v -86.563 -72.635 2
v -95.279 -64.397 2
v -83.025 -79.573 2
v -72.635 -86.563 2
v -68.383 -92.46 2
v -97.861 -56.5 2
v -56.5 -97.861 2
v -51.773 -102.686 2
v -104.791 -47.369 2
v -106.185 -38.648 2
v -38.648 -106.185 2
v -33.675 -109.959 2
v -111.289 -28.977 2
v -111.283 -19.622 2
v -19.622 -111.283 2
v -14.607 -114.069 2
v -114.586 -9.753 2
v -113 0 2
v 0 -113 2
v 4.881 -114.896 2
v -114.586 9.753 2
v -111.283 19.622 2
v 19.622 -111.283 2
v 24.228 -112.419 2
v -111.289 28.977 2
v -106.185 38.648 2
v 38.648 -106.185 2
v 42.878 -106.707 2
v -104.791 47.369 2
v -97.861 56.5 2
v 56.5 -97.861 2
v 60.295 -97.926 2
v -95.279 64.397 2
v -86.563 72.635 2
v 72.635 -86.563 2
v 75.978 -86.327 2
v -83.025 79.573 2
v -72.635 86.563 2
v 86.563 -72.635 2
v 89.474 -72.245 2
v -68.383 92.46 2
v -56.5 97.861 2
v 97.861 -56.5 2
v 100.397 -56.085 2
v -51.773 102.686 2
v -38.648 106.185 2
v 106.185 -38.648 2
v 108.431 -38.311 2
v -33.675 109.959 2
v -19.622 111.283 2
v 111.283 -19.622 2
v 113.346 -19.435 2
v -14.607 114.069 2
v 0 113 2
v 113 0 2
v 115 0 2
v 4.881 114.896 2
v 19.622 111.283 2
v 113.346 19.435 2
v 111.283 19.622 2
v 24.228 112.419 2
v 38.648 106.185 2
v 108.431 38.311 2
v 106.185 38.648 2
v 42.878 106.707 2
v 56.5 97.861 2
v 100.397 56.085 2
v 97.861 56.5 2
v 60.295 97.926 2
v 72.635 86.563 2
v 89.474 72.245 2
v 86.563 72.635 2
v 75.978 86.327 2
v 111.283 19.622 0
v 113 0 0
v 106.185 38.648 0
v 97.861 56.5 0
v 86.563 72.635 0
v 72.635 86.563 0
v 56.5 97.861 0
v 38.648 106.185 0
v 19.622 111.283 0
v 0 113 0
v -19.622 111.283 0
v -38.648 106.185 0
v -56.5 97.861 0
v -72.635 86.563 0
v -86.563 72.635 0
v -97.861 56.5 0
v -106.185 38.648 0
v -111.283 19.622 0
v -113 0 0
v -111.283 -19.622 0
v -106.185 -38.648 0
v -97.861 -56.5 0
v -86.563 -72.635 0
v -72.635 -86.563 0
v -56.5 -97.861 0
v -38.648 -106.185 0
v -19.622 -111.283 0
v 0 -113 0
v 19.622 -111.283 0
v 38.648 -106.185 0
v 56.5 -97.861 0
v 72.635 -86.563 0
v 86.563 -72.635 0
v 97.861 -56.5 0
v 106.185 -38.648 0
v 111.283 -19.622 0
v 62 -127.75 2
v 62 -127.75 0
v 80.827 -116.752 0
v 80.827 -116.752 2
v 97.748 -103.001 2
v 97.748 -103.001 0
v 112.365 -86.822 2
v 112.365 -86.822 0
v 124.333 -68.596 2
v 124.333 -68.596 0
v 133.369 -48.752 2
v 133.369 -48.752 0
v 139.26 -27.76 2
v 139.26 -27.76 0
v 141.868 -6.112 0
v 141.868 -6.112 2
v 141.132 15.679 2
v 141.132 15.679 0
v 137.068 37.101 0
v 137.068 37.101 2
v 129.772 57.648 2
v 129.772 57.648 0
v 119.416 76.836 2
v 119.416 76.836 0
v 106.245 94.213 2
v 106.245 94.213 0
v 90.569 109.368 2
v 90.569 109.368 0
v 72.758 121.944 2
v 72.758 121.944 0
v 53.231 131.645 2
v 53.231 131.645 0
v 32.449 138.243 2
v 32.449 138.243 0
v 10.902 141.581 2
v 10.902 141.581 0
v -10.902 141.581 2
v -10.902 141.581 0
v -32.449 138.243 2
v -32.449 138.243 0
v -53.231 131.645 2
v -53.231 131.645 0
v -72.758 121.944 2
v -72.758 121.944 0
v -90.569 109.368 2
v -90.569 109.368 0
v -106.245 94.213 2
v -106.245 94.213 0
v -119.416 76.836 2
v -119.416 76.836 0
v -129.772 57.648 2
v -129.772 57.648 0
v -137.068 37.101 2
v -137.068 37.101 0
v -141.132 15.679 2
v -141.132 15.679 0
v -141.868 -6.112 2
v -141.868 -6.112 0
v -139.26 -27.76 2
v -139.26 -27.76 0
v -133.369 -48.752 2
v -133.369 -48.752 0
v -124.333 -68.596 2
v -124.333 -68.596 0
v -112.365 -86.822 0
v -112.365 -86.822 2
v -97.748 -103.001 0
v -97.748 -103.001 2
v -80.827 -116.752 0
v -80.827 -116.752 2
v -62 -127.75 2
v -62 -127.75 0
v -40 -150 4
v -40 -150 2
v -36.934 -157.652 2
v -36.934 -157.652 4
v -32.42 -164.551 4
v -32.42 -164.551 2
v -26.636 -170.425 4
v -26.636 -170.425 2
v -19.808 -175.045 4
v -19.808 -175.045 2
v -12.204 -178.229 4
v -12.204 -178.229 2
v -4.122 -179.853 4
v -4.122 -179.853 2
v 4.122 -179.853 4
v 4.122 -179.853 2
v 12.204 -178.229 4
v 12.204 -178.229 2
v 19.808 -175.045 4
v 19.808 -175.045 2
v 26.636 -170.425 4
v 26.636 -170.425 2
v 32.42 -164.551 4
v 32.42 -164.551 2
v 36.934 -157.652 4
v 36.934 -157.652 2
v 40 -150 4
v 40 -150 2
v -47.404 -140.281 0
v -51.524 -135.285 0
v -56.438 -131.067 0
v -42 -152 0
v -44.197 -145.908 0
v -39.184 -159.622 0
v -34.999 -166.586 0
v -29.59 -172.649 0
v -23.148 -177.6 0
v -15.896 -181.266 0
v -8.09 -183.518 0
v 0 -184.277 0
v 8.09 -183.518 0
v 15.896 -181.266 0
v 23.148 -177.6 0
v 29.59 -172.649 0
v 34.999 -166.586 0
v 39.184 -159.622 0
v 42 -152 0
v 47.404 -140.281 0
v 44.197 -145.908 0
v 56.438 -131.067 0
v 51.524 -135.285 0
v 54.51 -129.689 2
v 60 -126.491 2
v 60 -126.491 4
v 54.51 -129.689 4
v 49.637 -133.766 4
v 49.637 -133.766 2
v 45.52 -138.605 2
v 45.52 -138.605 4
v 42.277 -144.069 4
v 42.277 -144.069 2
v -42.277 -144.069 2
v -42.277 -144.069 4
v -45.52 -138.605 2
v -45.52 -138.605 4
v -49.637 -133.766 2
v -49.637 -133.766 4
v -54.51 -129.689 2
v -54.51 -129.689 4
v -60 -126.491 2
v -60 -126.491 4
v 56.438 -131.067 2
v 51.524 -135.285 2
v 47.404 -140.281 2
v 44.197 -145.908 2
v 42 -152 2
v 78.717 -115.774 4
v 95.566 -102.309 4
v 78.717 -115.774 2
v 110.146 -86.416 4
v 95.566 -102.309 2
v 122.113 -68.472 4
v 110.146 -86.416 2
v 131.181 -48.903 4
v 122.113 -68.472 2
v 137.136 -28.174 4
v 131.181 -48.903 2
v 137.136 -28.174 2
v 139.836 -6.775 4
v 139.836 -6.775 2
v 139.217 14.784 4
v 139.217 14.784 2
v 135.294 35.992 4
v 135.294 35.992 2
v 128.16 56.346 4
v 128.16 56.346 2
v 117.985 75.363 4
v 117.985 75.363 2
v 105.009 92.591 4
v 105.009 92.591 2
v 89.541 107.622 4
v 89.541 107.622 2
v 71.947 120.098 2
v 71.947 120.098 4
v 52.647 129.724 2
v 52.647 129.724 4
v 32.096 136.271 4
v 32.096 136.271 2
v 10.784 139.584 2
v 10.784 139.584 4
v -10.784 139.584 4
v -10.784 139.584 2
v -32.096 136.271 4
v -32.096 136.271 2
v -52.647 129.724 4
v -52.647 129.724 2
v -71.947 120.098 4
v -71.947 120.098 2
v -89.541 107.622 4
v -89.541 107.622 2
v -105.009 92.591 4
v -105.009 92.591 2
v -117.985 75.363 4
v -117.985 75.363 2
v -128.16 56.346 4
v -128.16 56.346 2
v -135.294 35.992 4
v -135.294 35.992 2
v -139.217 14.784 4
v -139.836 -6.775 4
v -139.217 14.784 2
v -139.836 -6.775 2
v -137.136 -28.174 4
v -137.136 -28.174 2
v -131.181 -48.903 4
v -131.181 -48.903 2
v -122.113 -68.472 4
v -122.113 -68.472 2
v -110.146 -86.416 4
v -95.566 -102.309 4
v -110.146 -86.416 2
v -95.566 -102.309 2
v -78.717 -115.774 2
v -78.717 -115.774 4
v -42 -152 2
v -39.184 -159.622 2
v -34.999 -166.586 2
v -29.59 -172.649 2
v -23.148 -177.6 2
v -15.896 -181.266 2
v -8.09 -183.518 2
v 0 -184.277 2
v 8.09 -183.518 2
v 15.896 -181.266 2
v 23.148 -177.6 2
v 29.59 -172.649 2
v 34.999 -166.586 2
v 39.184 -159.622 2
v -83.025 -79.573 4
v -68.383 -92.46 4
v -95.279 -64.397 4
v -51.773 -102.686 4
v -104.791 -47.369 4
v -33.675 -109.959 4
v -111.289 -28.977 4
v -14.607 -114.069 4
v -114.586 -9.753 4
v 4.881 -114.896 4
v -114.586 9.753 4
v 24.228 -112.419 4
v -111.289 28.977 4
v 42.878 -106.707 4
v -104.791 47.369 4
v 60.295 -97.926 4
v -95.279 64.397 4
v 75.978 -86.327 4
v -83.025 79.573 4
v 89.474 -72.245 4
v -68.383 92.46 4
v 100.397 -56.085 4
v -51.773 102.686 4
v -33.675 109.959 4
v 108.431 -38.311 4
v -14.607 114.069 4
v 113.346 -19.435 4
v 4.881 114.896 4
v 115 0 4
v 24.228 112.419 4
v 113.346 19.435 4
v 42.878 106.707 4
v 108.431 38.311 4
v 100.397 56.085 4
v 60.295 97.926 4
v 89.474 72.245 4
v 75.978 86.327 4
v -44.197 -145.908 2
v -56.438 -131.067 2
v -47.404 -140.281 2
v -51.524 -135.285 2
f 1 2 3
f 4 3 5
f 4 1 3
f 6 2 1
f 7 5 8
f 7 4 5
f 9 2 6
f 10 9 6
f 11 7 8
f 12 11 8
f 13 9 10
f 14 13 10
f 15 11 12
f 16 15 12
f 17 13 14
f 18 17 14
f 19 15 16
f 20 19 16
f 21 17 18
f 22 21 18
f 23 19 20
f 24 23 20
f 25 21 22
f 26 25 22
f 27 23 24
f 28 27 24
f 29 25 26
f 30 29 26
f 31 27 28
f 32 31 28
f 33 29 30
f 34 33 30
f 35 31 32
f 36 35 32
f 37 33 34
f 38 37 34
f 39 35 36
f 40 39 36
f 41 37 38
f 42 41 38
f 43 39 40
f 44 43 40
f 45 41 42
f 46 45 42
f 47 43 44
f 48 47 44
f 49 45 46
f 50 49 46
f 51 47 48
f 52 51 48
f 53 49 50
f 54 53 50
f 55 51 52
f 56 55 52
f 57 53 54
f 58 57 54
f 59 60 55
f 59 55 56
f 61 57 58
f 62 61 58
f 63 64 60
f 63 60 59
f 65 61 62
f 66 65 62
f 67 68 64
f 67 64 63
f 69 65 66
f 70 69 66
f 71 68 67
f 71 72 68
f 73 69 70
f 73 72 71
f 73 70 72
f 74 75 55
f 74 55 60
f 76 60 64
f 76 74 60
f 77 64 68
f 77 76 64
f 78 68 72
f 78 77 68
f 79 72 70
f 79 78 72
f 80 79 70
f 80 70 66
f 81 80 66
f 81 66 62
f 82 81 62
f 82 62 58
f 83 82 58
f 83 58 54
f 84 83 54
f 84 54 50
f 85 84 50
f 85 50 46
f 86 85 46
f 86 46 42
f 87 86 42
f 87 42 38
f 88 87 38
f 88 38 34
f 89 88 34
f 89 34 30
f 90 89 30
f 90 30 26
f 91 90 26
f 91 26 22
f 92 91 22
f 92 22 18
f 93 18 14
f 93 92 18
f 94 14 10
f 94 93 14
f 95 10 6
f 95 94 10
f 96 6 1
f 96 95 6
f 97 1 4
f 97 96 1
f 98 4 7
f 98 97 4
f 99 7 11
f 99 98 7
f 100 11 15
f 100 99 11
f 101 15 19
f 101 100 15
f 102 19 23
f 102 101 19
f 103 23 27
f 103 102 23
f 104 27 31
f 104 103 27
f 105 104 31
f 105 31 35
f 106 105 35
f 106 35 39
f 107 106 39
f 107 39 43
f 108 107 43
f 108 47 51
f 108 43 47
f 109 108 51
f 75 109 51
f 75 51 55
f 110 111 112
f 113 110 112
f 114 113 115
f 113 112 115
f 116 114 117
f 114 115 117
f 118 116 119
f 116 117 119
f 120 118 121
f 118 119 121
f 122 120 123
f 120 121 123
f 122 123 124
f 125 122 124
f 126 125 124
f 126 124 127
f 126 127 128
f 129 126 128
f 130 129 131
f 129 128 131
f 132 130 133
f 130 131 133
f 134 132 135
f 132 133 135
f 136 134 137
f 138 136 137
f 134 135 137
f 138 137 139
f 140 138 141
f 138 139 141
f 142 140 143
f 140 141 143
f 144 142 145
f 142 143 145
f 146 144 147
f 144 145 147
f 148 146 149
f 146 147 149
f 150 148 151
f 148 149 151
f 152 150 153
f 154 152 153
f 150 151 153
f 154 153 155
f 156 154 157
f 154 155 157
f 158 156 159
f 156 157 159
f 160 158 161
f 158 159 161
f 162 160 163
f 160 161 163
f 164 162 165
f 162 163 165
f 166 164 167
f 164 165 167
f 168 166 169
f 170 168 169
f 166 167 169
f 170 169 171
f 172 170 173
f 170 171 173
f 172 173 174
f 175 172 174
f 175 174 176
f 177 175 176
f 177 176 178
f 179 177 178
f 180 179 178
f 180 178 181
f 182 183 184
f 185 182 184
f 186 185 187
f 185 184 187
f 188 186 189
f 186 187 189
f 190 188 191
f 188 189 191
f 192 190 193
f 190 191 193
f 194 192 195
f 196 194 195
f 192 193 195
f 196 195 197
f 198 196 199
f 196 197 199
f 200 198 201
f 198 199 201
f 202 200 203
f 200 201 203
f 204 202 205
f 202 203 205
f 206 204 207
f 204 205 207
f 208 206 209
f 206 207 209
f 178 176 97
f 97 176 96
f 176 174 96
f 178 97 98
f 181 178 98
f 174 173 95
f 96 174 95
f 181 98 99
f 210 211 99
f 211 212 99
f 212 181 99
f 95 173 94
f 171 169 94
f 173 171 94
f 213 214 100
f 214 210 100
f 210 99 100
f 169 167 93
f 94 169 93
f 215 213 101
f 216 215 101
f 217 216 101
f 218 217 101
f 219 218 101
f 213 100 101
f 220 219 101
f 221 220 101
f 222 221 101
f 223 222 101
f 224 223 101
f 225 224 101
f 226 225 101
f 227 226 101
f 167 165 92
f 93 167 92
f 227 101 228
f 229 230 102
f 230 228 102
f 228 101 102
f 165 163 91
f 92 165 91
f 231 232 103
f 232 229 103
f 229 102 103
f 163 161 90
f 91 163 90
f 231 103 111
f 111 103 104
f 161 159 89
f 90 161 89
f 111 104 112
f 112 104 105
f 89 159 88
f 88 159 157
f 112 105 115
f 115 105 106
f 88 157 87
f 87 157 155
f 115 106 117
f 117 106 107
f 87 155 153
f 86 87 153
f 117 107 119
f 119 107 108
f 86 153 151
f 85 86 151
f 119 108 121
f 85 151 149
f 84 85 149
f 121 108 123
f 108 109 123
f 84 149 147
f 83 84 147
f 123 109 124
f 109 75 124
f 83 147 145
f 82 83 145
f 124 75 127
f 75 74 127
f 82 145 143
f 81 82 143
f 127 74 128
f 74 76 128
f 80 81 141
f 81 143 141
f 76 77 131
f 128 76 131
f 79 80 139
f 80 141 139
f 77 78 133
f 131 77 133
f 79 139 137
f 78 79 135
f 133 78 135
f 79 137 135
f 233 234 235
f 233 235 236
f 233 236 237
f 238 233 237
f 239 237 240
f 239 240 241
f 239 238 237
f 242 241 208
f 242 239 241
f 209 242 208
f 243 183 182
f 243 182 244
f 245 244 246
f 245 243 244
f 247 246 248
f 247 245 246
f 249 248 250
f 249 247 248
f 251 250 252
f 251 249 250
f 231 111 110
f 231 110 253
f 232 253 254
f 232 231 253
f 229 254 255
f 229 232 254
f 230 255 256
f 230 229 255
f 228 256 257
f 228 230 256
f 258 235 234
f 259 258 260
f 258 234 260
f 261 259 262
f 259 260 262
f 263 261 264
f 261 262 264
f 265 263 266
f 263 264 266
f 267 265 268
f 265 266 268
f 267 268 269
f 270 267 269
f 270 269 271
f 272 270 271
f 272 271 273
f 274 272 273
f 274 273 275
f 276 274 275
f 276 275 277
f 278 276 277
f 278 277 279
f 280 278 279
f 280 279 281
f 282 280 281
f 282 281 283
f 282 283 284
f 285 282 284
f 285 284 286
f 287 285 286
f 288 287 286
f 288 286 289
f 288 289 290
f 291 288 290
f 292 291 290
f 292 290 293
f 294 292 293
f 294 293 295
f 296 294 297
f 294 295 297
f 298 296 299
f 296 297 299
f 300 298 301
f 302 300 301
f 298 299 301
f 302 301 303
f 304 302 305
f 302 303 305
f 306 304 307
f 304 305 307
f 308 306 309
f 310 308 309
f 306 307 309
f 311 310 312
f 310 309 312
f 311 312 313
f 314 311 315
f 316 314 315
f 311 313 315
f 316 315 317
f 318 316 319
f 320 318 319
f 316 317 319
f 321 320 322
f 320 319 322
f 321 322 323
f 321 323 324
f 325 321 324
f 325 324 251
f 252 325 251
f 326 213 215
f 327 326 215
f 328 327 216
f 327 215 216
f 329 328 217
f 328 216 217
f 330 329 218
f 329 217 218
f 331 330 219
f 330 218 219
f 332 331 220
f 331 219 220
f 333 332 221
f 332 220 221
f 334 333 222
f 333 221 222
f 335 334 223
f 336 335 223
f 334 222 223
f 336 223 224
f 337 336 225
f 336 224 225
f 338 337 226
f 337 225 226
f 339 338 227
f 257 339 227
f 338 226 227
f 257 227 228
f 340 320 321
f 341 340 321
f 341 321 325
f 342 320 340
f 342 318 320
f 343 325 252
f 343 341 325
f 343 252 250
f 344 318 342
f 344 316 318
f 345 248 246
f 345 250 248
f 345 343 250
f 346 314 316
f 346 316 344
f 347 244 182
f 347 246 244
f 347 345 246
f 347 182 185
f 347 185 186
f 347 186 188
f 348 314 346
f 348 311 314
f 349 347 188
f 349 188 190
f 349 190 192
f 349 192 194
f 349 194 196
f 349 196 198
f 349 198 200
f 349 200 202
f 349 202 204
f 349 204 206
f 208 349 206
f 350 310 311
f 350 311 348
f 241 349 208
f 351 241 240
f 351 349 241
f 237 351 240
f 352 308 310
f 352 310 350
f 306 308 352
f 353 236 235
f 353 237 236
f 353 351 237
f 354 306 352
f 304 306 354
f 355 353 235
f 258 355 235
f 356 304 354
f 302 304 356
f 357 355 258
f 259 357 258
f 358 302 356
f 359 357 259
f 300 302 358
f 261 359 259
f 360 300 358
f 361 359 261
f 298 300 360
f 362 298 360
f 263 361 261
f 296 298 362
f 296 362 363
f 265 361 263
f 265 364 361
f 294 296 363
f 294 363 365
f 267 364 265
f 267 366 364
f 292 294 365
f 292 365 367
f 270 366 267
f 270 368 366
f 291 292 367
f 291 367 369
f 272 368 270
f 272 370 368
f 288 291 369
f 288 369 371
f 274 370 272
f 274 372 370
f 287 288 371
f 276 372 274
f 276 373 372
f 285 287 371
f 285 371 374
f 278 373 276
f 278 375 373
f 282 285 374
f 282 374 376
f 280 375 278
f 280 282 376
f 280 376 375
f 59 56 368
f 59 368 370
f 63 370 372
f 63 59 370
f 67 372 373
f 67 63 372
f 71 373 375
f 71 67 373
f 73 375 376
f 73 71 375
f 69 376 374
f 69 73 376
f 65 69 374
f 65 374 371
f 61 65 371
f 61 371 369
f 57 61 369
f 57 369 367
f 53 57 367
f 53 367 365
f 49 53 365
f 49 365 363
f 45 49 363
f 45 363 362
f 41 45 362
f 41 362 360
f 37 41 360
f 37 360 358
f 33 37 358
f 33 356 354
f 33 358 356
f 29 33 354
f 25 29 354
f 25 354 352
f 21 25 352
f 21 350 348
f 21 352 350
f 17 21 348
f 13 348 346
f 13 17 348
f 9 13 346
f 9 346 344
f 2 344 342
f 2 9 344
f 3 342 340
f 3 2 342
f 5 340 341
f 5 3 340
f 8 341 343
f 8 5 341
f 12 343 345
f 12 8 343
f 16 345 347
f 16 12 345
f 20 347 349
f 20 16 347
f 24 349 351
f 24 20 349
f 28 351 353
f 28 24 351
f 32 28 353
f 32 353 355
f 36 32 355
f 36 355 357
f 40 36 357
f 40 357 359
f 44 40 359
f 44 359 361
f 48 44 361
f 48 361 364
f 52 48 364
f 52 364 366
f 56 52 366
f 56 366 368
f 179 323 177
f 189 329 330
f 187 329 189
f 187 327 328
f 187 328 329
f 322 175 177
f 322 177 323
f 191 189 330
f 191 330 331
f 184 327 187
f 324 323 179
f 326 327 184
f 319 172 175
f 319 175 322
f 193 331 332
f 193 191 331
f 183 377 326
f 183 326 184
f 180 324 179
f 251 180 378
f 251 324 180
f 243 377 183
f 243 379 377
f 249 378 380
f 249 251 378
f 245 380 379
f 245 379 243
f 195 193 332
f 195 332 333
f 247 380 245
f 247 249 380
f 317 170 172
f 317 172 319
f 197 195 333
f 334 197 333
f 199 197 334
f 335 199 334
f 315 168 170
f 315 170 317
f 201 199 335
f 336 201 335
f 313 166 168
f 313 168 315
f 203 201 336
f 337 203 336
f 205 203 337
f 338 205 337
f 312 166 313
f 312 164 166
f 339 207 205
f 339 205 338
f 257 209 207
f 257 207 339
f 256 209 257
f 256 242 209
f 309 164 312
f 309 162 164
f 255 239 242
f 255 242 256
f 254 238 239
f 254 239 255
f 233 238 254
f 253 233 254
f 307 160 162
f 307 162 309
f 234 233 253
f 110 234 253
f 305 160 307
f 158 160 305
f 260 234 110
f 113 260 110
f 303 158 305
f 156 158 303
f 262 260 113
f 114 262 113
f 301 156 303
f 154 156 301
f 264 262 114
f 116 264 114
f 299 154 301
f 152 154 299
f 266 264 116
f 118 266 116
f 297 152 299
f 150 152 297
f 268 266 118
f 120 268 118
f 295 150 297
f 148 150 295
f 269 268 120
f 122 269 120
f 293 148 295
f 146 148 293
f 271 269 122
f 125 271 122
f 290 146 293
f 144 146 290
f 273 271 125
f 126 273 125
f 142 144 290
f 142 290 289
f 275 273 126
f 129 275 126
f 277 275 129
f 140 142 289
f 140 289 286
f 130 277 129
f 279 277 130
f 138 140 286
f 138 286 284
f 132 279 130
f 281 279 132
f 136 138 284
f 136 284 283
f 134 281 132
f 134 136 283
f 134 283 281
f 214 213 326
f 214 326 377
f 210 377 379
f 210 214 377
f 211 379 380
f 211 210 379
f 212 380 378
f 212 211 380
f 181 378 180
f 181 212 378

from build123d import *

# Parameters (mm, degrees)
PAD_DEPTH       = 4
SKETCH001_R     = 115
POCKET_DEPTH    = 10
PAD001_DEPTH    = 2
SKETCH003_R     = 113
POCKET001_DEPTH = 5


with BuildPart() as part:
    # Sketch → Pad (new body)
    with BuildSketch(Plane.XY):
        with BuildLine():
            ThreePointArc((60, -126.491106), (0, 140), (-60, -126.491106))
            ThreePointArc((-40, -150), (-47.476432, -136.098648), (-60, -126.491106))
            ThreePointArc((-40, -150), (0, -180.057233), (40, -150))
            ThreePointArc((60, -126.491106), (47.476432, -136.098648), (40, -150))
        make_face()
    extrude(amount=PAD_DEPTH)

    # Sketch001 → Pocket (cut)
    with BuildSketch(Plane.XY):
        Circle(SKETCH001_R)
    extrude(amount=POCKET_DEPTH, mode=Mode.SUBTRACT)

    # Sketch002 → Pad001 (join)
    with BuildSketch(Plane.XY):
        with BuildLine():
            ThreePointArc((62, -127.749755), (0, 142), (-62, -127.749755))
            ThreePointArc((-42, -152), (-49.356513, -137.694705), (-62, -127.749755))
            ThreePointArc((-42, -152), (0, -184.276954), (42, -152))
            ThreePointArc((62, -127.749755), (49.356513, -137.694705), (42, -152))
        make_face()
    extrude(amount=PAD001_DEPTH)

    # Sketch003 → Pocket001 (cut)
    with BuildSketch(Plane.XY):
        Circle(SKETCH003_R)
    extrude(amount=POCKET001_DEPTH, mode=Mode.SUBTRACT)


solid = part.part
